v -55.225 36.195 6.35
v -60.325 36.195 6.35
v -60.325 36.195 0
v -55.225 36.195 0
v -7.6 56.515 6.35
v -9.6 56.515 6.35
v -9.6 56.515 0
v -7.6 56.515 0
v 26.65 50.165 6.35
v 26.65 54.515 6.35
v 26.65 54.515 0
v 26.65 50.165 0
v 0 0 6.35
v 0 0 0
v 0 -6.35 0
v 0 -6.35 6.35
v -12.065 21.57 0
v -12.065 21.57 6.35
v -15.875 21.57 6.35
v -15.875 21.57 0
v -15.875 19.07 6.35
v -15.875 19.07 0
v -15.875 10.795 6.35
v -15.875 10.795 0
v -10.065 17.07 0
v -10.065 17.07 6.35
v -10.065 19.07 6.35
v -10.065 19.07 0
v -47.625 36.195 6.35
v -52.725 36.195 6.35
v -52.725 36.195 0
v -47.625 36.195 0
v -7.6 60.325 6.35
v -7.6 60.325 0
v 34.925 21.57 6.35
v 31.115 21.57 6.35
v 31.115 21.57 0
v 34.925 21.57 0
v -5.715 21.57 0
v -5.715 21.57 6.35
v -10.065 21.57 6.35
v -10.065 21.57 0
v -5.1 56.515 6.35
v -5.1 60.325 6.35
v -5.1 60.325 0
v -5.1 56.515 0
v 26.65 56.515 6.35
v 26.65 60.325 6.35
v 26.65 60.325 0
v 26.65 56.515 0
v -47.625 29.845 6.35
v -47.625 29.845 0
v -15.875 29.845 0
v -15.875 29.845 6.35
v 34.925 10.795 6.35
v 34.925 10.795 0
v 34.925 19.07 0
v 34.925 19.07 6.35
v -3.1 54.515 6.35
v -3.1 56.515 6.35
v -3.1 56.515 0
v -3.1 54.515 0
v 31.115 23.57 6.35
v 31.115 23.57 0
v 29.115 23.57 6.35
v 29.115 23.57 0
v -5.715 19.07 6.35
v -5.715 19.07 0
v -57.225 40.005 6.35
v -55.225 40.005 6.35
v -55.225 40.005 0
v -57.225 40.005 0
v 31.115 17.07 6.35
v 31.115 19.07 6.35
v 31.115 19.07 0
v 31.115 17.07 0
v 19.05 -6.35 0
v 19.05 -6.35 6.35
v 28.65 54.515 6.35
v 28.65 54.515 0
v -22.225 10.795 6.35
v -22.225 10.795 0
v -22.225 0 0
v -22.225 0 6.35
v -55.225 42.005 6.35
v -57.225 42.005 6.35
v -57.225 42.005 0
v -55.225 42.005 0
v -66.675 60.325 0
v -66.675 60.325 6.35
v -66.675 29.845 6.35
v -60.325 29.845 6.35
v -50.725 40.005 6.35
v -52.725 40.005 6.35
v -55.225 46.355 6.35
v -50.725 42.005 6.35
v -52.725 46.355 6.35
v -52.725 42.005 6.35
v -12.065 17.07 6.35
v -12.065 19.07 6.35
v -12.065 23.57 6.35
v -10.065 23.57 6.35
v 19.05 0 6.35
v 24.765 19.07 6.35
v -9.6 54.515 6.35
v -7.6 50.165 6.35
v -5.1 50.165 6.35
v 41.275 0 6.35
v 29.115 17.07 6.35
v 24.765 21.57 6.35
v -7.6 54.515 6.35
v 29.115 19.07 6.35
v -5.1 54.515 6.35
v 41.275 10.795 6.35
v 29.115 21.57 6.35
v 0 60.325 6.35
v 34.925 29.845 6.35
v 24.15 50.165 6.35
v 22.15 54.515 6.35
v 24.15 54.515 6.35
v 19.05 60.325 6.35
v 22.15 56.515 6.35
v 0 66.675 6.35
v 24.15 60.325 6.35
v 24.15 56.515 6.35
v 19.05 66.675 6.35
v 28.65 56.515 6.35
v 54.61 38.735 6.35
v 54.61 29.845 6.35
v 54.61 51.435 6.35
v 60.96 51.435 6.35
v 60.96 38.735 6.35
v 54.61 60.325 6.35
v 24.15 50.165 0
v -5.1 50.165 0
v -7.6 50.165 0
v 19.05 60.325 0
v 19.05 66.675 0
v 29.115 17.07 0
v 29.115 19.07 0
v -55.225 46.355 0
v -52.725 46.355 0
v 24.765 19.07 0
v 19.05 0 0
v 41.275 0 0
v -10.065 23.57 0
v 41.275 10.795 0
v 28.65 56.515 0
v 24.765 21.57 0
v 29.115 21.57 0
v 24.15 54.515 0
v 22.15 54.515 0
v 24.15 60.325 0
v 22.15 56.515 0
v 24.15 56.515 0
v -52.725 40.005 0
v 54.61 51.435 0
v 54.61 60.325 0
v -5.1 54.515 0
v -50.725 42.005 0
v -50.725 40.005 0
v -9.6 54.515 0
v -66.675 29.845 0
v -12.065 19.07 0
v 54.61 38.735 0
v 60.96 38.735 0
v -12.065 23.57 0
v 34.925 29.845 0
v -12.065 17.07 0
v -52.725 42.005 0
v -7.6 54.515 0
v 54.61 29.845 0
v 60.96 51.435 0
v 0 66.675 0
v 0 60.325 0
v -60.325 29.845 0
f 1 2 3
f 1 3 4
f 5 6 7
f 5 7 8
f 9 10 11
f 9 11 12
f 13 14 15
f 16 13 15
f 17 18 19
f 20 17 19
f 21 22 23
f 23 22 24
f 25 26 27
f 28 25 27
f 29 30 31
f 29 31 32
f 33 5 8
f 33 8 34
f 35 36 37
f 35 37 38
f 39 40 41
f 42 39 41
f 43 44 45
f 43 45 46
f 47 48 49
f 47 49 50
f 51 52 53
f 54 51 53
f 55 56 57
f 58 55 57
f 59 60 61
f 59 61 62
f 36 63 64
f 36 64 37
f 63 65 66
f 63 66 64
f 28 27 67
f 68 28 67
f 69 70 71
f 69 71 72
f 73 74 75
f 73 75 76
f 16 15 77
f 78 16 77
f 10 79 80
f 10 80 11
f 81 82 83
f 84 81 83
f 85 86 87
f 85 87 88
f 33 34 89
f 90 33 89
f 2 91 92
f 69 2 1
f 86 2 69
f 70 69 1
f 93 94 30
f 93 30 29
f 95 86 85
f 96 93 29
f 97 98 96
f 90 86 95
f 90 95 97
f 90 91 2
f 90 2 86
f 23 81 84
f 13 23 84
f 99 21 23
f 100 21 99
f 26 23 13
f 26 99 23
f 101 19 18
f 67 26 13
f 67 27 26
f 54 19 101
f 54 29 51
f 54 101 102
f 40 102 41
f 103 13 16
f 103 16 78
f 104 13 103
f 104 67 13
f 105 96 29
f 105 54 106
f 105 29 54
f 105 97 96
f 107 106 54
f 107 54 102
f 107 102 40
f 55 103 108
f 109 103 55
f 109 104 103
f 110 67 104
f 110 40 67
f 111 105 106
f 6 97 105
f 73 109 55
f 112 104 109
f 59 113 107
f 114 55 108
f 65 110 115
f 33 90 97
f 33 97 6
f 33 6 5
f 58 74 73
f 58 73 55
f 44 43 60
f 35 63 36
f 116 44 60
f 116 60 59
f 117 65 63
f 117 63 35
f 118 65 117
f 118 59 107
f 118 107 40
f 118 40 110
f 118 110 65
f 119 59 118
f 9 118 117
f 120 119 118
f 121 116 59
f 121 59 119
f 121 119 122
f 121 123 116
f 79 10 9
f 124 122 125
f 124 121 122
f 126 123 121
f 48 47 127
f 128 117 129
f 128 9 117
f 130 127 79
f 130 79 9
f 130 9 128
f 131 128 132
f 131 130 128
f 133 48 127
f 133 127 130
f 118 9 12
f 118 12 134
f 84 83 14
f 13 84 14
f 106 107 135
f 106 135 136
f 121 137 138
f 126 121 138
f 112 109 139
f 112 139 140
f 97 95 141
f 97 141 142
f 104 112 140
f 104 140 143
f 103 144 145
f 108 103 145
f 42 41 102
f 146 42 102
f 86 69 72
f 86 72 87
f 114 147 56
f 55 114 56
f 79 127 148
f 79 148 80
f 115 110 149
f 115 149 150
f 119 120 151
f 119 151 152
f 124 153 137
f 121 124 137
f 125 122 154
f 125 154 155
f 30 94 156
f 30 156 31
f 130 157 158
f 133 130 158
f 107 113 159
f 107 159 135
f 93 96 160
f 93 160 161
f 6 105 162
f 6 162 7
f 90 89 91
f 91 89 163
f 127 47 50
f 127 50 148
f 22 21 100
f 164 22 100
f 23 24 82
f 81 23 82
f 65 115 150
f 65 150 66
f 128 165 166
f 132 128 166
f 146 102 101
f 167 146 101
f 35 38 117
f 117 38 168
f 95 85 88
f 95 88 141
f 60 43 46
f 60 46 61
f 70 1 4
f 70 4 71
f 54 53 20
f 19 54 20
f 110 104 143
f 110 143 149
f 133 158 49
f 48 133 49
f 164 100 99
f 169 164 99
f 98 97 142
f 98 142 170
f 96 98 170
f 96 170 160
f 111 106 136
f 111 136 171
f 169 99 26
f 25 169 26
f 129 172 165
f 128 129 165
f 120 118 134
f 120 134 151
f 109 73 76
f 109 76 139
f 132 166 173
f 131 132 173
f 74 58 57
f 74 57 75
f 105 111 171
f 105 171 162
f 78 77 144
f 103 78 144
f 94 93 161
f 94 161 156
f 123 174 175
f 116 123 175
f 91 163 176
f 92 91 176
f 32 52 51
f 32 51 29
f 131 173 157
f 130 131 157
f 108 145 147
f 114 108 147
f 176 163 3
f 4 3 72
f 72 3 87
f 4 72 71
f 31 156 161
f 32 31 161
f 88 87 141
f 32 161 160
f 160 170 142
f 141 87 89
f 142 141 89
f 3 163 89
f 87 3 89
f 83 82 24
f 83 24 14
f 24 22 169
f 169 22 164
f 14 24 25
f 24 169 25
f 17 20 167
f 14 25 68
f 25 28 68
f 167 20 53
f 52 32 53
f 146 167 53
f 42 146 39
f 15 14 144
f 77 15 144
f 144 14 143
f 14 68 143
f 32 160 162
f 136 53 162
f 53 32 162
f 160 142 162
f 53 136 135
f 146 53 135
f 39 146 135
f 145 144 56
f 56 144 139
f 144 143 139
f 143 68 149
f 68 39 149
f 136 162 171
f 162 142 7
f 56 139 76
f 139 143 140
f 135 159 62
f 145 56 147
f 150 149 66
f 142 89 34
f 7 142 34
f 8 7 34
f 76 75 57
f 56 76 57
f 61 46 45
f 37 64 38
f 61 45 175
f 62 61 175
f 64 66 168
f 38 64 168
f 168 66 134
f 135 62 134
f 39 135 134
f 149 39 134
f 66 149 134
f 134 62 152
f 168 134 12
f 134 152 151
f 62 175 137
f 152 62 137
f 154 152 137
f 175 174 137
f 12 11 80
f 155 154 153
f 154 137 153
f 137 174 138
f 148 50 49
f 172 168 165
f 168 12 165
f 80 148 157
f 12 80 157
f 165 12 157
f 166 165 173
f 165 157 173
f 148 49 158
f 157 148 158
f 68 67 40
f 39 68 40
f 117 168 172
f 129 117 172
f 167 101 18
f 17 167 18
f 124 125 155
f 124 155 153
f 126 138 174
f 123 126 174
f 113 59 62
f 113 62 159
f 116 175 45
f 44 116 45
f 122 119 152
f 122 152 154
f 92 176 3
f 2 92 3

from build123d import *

# Parameters (mm, degrees)
BOSS_EXTRUDE1_DEPTH = 6.35
SKETCH2_W           = 12.7
SKETCH2_H           = 6.35
CUT_EXTRUDE1_DEPTH  = 7.35
CUT_EXTRUDE2_DEPTH  = 7.35
CUT_EXTRUDE3_DEPTH  = 7.35


with BuildPart() as part:
    # Sketch1 → Boss-Extrude1 (new body)
    with BuildSketch(Plane.XY):
        Polygon((0, -6.35), (19.05, -6.35), (19.05, 0), (34.925, 0), (41.275, 0), (41.275, 10.795), (34.925, 10.795), (34.925, 29.845), (54.61, 29.845), (54.61, 38.735), (60.96, 38.735), (60.96, 51.435), (54.61, 51.435), (54.61, 60.325), (34.925, 60.325), (19.05, 60.325), (19.05, 66.675), (0, 66.675), (0, 60.325), (-15.875, 60.325), (-66.675, 60.325), (-66.675, 29.845), (-15.875, 29.845), (-15.875, 10.795), (-22.225, 10.795), (-22.225, 0), (-15.875, 0), (0, 0), align=None)
    extrude(amount=BOSS_EXTRUDE1_DEPTH)

    # Sketch2 → Cut-Extrude1 (cut, through all)
    with BuildSketch(Plane.XY.offset(6.35)):
        with Locations((-53.975, 33.02)):
            Rectangle(SKETCH2_W, SKETCH2_H)
    extrude(amount=-CUT_EXTRUDE1_DEPTH, mode=Mode.SUBTRACT)

    # Sketch3 → Cut-Extrude2 (cut, through all)
    with BuildSketch(Plane.XY.offset(6.35)):
        Polygon((-15.875, 21.57), (-15.875, 19.07), (-12.065, 19.07), (-12.065, 17.07), (-10.065, 17.07), (-10.065, 19.07), (-5.715, 19.07), (-5.715, 21.57), (-10.065, 21.57), (-10.065, 23.57), (-12.065, 23.57), (-12.065, 21.57), align=None)
        Polygon((34.925, 21.57), (34.925, 19.07), (31.115, 19.07), (31.115, 17.07), (29.115, 17.07), (29.115, 19.07), (24.765, 19.07), (24.765, 21.57), (29.115, 21.57), (29.115, 23.57), (31.115, 23.57), (31.115, 21.57), align=None)
    extrude(amount=-CUT_EXTRUDE2_DEPTH, mode=Mode.SUBTRACT)

    # Sketch5 → Cut-Extrude3 (cut, through all)
    with BuildSketch(Plane.XY.offset(6.35)):
        Polygon((-3.1, 56.515), (-3.1, 54.515), (-5.1, 54.515), (-5.1, 50.165), (-7.6, 50.165), (-7.6, 54.515), (-9.6, 54.515), (-9.6, 56.515), (-7.6, 56.515), (-7.6, 60.325), (-5.1, 60.325), (-5.1, 56.515), align=None)
        Polygon((26.65, 60.325), (26.65, 56.515), (28.65, 56.515), (28.65, 54.515), (26.65, 54.515), (26.65, 50.165), (24.15, 50.165), (24.15, 54.515), (22.15, 54.515), (22.15, 56.515), (24.15, 56.515), (24.15, 60.325), align=None)
        Polygon((-52.725, 42.005), (-50.725, 42.005), (-50.725, 40.005), (-52.725, 40.005), (-52.725, 36.195), (-55.225, 36.195), (-55.225, 40.005), (-57.225, 40.005), (-57.225, 42.005), (-55.225, 42.005), (-55.225, 46.355), (-52.725, 46.355), align=None)
    extrude(amount=-CUT_EXTRUDE3_DEPTH, mode=Mode.SUBTRACT)


solid = part.part
